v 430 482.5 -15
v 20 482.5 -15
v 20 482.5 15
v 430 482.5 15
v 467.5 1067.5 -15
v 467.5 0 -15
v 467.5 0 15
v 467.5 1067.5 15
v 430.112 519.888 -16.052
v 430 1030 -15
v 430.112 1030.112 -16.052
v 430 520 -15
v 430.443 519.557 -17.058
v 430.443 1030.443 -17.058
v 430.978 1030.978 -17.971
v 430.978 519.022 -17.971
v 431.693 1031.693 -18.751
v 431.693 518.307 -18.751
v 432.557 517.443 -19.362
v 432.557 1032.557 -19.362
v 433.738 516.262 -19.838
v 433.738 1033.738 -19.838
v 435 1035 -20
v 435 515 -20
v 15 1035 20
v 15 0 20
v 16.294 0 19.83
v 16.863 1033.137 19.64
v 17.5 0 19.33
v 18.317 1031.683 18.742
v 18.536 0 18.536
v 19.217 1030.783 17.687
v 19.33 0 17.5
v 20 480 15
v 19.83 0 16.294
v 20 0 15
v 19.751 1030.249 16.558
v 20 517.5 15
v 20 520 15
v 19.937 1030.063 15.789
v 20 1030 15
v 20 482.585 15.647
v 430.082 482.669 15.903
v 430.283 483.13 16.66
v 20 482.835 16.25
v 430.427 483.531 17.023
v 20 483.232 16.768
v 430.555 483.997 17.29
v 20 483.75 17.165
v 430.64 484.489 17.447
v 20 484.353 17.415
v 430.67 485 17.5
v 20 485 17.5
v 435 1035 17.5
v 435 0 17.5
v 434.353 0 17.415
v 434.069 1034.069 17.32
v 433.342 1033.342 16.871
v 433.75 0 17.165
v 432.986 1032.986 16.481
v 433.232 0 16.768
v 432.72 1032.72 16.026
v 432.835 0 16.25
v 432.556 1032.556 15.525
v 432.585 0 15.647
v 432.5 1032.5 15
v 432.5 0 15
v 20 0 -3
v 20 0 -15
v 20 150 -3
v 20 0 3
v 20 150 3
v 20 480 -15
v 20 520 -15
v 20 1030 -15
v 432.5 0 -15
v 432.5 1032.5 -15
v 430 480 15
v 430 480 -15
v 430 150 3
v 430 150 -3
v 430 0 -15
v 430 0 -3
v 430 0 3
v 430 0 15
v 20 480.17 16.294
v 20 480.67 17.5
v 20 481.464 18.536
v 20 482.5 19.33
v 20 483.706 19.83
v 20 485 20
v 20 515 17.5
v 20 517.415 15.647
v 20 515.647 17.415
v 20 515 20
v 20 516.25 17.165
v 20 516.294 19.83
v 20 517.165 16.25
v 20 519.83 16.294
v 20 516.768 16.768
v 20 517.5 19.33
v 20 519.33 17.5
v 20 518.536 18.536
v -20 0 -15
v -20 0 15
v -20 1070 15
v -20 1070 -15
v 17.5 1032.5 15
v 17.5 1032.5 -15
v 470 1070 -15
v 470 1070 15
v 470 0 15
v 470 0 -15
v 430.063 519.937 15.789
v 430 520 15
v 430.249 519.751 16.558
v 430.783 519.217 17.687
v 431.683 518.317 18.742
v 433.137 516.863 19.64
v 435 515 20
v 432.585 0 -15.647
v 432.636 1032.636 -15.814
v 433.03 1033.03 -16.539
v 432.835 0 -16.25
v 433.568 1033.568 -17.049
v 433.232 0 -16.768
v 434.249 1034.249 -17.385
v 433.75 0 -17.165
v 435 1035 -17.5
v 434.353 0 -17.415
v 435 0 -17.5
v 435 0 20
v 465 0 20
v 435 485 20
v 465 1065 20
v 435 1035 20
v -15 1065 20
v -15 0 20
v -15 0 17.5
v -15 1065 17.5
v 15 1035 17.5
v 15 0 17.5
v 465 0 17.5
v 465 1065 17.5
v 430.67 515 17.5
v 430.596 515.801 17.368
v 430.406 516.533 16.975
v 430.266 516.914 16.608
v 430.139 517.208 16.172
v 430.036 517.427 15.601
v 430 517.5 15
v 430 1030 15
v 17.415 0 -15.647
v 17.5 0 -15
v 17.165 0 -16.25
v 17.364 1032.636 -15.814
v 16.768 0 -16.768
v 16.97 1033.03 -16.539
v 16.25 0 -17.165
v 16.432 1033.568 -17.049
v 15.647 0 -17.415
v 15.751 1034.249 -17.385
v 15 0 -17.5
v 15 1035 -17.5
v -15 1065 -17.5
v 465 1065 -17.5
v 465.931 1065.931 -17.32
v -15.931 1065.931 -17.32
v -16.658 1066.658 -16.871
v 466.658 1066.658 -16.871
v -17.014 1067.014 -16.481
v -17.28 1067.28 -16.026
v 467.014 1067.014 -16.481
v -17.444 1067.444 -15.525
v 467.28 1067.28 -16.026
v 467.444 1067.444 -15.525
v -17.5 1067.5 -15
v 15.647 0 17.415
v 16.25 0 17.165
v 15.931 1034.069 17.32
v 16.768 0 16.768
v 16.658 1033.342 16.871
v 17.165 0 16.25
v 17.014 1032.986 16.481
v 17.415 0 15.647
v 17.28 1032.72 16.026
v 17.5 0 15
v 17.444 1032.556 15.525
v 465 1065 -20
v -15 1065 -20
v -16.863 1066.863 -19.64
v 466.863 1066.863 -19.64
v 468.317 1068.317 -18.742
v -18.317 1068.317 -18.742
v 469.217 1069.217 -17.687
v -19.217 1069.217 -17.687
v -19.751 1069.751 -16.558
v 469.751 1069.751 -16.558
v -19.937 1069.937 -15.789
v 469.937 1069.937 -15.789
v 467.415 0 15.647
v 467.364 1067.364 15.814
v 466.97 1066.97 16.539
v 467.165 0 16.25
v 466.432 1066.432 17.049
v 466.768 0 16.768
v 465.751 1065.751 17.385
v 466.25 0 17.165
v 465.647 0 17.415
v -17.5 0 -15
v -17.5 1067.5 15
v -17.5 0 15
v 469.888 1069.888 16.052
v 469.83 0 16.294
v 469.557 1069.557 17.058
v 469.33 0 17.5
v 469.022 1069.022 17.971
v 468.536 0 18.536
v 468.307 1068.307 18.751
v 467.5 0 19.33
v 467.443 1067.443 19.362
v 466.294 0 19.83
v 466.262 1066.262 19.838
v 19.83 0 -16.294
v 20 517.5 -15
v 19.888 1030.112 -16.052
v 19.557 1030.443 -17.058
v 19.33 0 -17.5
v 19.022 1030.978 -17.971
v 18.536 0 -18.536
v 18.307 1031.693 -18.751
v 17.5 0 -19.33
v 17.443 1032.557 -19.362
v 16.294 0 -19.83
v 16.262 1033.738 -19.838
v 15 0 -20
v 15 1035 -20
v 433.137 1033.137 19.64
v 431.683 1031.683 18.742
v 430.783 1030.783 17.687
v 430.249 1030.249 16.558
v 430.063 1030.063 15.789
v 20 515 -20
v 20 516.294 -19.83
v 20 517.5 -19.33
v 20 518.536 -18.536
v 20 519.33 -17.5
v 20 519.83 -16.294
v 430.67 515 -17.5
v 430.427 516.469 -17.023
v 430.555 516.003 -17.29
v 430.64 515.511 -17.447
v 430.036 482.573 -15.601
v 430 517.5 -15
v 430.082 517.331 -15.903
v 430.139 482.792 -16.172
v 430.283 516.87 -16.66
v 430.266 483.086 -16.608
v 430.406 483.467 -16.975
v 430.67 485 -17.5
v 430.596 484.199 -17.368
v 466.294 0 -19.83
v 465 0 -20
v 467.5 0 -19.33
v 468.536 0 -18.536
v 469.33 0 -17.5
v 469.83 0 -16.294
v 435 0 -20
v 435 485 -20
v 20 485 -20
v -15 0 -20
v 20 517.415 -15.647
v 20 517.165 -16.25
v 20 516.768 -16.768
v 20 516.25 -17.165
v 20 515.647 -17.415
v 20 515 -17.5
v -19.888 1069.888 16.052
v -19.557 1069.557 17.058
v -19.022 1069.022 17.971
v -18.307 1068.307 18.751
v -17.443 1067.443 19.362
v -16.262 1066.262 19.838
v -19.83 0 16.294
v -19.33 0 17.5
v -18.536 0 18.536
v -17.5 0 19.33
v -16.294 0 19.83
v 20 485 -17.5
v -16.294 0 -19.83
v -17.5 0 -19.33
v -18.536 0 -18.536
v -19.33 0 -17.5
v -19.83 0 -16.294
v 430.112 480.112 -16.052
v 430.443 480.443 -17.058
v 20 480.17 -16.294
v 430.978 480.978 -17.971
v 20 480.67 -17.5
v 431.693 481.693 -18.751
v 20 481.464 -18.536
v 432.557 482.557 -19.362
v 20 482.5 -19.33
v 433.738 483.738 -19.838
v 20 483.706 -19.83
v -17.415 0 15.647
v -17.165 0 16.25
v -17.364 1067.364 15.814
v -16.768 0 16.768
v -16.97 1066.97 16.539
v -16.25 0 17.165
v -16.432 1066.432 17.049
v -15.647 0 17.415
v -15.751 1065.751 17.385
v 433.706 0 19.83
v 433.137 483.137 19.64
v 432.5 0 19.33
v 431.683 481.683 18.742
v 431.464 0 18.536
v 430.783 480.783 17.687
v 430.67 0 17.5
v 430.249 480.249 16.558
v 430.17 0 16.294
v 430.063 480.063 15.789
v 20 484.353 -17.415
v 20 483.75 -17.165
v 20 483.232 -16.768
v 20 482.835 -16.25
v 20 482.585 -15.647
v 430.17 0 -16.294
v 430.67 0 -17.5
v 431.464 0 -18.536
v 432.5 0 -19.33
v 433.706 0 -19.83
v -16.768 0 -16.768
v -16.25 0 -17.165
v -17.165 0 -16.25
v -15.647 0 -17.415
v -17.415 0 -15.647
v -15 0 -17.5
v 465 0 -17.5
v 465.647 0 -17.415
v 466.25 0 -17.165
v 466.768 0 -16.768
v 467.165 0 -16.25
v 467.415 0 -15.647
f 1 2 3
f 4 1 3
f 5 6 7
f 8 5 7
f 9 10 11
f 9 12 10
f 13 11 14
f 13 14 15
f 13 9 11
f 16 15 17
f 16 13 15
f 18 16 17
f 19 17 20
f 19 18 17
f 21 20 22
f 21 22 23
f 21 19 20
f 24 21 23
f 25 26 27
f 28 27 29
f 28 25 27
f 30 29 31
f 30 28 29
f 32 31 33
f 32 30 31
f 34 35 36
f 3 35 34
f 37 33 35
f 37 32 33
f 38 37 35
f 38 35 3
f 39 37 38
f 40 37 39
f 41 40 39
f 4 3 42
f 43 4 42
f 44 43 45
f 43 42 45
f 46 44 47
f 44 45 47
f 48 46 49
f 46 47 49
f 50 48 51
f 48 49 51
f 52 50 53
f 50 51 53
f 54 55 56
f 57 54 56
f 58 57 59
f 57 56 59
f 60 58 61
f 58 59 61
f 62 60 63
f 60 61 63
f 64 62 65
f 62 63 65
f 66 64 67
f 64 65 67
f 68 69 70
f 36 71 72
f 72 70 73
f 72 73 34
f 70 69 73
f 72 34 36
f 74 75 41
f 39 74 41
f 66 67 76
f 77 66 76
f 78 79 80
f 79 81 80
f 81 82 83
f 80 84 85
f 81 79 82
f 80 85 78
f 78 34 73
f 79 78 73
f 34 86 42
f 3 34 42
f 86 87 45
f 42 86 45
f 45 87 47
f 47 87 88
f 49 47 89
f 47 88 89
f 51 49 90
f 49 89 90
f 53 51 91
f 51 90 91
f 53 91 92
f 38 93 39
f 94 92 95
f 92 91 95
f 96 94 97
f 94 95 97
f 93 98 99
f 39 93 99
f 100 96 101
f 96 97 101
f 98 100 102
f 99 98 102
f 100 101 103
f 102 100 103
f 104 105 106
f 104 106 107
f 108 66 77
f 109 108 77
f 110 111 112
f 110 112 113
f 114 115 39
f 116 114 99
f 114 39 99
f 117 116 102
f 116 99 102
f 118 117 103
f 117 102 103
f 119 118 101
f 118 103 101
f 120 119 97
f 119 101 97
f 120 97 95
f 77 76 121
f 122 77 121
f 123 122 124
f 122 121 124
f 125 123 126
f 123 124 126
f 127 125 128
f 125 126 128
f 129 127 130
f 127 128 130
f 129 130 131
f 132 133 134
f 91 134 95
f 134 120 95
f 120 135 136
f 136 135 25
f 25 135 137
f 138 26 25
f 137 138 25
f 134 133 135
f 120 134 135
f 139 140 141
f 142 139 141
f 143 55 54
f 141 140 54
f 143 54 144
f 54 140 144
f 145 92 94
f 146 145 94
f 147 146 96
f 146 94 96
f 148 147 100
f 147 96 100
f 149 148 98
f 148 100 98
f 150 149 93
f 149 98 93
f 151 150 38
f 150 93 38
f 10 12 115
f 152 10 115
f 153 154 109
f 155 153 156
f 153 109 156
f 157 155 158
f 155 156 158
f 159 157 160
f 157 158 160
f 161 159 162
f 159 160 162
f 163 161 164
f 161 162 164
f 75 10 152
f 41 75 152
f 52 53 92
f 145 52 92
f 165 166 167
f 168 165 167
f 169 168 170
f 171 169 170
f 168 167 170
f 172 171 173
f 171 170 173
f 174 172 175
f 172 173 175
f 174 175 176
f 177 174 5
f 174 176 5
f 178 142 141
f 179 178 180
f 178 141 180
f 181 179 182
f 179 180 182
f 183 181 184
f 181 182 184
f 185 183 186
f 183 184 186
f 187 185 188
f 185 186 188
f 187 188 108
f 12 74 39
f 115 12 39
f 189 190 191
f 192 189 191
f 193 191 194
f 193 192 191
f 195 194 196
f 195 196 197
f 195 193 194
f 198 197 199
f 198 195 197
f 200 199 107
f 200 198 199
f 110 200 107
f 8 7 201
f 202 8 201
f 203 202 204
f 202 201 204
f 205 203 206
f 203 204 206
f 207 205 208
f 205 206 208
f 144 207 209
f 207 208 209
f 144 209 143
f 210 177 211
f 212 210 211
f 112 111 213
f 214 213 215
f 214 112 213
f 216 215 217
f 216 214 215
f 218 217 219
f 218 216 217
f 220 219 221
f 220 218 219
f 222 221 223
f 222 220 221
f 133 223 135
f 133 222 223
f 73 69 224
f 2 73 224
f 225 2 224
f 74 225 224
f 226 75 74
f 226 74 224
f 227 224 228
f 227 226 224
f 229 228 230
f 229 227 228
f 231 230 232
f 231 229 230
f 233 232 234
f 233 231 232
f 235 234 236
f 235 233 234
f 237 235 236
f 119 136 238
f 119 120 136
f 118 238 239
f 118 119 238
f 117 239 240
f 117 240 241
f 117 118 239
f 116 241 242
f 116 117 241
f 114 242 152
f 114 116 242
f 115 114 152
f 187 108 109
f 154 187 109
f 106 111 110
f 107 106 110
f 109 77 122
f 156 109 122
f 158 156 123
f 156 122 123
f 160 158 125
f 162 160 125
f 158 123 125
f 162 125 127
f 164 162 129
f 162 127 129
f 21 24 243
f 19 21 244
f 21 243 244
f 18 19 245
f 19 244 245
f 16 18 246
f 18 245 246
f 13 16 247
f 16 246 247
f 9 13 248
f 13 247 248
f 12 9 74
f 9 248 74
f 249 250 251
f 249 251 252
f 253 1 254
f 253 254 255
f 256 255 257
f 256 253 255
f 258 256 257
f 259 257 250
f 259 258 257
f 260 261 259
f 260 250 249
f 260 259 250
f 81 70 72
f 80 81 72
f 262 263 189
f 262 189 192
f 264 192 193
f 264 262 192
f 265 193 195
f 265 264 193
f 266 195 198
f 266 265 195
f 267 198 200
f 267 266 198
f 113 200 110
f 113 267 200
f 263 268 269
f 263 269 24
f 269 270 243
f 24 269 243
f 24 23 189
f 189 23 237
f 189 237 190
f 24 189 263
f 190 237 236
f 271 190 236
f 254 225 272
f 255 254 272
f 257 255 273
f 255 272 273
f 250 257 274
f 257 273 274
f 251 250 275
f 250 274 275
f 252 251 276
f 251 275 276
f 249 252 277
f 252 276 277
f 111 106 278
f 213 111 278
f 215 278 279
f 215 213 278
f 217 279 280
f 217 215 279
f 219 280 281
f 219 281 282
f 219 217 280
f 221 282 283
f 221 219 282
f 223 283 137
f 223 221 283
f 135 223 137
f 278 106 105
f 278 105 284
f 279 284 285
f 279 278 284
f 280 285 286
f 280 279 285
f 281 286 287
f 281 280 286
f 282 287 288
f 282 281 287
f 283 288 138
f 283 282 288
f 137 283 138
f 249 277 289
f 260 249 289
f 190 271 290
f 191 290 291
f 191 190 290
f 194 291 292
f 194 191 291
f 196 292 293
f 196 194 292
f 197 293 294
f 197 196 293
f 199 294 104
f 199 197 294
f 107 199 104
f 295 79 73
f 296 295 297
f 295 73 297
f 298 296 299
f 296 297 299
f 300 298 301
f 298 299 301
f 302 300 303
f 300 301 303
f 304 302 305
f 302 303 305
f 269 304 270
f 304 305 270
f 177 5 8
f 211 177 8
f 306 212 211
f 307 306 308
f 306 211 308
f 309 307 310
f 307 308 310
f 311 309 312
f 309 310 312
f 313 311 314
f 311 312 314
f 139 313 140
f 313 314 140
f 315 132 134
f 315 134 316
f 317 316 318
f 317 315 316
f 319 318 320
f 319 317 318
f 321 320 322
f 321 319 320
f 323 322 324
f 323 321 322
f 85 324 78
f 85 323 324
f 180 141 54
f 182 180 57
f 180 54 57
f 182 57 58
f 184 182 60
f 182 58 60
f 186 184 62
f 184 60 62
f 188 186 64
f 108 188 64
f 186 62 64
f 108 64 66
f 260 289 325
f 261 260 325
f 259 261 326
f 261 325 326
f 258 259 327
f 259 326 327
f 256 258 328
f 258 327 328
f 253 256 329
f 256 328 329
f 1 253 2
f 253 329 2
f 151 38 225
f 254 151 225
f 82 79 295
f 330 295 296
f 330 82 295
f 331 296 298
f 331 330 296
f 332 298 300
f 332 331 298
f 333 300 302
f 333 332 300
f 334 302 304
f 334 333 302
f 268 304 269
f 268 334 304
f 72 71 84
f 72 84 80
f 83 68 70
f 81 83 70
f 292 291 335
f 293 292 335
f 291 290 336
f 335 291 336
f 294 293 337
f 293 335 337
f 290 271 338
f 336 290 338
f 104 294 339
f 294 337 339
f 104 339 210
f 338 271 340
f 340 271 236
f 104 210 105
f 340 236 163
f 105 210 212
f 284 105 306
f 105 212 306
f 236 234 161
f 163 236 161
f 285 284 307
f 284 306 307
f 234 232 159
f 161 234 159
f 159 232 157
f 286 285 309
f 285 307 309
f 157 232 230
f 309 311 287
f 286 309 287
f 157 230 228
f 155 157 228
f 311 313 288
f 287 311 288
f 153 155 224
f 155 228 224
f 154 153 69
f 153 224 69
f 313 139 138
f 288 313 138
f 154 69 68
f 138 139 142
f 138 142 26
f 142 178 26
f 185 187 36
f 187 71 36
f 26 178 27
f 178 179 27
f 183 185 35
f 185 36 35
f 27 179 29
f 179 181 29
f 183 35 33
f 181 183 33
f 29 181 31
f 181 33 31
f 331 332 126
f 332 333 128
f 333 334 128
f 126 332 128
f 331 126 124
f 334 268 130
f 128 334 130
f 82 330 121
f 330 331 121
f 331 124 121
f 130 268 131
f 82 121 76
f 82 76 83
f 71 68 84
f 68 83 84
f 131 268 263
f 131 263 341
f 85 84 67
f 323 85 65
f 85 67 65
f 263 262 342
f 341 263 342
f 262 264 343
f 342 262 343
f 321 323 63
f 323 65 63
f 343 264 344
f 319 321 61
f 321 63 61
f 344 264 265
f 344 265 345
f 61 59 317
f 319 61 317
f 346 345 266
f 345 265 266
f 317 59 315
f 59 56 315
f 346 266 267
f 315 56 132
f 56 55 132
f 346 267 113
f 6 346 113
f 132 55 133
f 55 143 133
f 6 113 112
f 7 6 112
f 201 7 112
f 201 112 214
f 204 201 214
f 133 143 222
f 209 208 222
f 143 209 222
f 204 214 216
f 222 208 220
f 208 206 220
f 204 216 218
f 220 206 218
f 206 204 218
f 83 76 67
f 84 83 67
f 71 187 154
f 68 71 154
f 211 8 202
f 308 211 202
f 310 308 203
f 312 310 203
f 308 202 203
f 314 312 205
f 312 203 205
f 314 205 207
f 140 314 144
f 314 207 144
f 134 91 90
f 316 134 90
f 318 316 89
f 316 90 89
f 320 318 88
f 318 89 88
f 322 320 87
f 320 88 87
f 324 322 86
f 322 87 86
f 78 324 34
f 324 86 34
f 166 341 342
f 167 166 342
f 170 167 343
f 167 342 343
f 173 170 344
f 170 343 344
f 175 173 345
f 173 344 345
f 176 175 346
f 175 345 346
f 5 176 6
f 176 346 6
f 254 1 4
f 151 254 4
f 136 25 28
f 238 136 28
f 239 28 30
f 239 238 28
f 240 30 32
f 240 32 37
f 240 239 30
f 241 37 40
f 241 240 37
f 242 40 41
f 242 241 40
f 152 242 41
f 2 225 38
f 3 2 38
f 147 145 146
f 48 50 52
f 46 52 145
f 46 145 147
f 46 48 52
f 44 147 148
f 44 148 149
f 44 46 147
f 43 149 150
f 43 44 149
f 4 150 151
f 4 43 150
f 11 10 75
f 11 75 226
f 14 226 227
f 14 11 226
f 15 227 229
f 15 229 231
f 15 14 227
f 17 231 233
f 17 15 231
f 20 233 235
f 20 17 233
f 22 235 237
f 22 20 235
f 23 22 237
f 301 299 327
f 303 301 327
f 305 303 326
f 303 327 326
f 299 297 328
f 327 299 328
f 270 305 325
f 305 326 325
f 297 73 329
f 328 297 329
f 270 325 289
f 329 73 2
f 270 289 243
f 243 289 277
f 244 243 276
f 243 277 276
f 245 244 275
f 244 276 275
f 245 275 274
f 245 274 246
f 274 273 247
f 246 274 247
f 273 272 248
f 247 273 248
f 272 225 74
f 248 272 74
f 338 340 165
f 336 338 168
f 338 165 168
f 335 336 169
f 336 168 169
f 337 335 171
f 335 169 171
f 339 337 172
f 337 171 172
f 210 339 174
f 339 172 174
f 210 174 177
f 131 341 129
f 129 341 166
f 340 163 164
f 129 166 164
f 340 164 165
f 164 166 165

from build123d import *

# Parameters (mm, degrees)
F5_W     = 150
F5_H     = 6
F6_DEPTH = 410


with BuildPart() as f2:
    # F2: sweep along a path in F1
    with BuildLine(Plane.XY) as f2_path:
        Line((0, 0), (0, 1050))
        Line((0, 1050), (450, 1050))
        Line((450, 1050), (450, 0))
    # F0 (on Front) → F2 (sweep)
    with BuildSketch(Plane.XZ):
        with BuildLine():
            Line((-15, -20), (15, -20))
            ThreePointArc((15, -20), (18.5355339059, -18.5355339059), (20, -15))
            Line((20, -15), (20, 15))
            ThreePointArc((20, 15), (18.5355339059, 18.5355339059), (15, 20))
            Line((15, 20), (-15, 20))
            ThreePointArc((-15, 20), (-18.5355339059, 18.5355339059), (-20, 15))
            Line((-20, 15), (-20, -15))
            ThreePointArc((-20, -15), (-18.5355339059, -18.5355339059), (-15, -20))
        make_face()
        with BuildLine():
            ThreePointArc((-15, -17.5), (-16.767766953, -16.767766953), (-17.5, -15))
            Line((-17.5, -15), (-17.5, 15))
            ThreePointArc((-17.5, 15), (-16.767766953, 16.767766953), (-15, 17.5))
            Line((-15, 17.5), (15, 17.5))
            ThreePointArc((15, 17.5), (16.767766953, 16.767766953), (17.5, 15))
            Line((17.5, 15), (17.5, -15))
            ThreePointArc((17.5, -15), (16.767766953, -16.767766953), (15, -17.5))
            Line((15, -17.5), (-15, -17.5))
        make_face(mode=Mode.SUBTRACT)
    sweep(path=f2_path.line, transition=Transition.RIGHT)

    # F3 (on face) → F4 (join, up to the next surface of F2)
    with BuildSketch(Plane.YZ.offset(20)):
        with BuildLine():
            Line((485, -20), (515, -20))
            ThreePointArc((515, -20), (518.5355339059, -18.5355339059), (520, -15))
            Line((520, -15), (520, 15))
            ThreePointArc((520, 15), (518.5355339059, 18.5355339059), (515, 20))
            Line((515, 20), (485, 20))
            ThreePointArc((485, 20), (481.4644660941, 18.5355339059), (480, 15))
            Line((480, 15), (480, -15))
            ThreePointArc((480, -15), (481.4644660941, -18.5355339059), (485, -20))
        make_face()
        with BuildLine():
            ThreePointArc((485, -17.5), (483.232233047, -16.767766953), (482.5, -15))
            Line((482.5, -15), (482.5, 15))
            ThreePointArc((482.5, 15), (483.232233047, 16.767766953), (485, 17.5))
            Line((485, 17.5), (515, 17.5))
            ThreePointArc((515, 17.5), (516.767766953, 16.767766953), (517.5, 15))
            Line((517.5, 15), (517.5, -15))
            ThreePointArc((517.5, -15), (516.767766953, -16.767766953), (515, -17.5))
            Line((515, -17.5), (485, -17.5))
        make_face(mode=Mode.SUBTRACT)
    extrude(until=Until.NEXT)

    # F5 (on face) → F6 (join, through all)
    with BuildSketch(Plane.YZ.offset(20)):
        with Locations((75, 0)):
            Rectangle(F5_W, F5_H)
    extrude(amount=F6_DEPTH)


solid = f2.part
